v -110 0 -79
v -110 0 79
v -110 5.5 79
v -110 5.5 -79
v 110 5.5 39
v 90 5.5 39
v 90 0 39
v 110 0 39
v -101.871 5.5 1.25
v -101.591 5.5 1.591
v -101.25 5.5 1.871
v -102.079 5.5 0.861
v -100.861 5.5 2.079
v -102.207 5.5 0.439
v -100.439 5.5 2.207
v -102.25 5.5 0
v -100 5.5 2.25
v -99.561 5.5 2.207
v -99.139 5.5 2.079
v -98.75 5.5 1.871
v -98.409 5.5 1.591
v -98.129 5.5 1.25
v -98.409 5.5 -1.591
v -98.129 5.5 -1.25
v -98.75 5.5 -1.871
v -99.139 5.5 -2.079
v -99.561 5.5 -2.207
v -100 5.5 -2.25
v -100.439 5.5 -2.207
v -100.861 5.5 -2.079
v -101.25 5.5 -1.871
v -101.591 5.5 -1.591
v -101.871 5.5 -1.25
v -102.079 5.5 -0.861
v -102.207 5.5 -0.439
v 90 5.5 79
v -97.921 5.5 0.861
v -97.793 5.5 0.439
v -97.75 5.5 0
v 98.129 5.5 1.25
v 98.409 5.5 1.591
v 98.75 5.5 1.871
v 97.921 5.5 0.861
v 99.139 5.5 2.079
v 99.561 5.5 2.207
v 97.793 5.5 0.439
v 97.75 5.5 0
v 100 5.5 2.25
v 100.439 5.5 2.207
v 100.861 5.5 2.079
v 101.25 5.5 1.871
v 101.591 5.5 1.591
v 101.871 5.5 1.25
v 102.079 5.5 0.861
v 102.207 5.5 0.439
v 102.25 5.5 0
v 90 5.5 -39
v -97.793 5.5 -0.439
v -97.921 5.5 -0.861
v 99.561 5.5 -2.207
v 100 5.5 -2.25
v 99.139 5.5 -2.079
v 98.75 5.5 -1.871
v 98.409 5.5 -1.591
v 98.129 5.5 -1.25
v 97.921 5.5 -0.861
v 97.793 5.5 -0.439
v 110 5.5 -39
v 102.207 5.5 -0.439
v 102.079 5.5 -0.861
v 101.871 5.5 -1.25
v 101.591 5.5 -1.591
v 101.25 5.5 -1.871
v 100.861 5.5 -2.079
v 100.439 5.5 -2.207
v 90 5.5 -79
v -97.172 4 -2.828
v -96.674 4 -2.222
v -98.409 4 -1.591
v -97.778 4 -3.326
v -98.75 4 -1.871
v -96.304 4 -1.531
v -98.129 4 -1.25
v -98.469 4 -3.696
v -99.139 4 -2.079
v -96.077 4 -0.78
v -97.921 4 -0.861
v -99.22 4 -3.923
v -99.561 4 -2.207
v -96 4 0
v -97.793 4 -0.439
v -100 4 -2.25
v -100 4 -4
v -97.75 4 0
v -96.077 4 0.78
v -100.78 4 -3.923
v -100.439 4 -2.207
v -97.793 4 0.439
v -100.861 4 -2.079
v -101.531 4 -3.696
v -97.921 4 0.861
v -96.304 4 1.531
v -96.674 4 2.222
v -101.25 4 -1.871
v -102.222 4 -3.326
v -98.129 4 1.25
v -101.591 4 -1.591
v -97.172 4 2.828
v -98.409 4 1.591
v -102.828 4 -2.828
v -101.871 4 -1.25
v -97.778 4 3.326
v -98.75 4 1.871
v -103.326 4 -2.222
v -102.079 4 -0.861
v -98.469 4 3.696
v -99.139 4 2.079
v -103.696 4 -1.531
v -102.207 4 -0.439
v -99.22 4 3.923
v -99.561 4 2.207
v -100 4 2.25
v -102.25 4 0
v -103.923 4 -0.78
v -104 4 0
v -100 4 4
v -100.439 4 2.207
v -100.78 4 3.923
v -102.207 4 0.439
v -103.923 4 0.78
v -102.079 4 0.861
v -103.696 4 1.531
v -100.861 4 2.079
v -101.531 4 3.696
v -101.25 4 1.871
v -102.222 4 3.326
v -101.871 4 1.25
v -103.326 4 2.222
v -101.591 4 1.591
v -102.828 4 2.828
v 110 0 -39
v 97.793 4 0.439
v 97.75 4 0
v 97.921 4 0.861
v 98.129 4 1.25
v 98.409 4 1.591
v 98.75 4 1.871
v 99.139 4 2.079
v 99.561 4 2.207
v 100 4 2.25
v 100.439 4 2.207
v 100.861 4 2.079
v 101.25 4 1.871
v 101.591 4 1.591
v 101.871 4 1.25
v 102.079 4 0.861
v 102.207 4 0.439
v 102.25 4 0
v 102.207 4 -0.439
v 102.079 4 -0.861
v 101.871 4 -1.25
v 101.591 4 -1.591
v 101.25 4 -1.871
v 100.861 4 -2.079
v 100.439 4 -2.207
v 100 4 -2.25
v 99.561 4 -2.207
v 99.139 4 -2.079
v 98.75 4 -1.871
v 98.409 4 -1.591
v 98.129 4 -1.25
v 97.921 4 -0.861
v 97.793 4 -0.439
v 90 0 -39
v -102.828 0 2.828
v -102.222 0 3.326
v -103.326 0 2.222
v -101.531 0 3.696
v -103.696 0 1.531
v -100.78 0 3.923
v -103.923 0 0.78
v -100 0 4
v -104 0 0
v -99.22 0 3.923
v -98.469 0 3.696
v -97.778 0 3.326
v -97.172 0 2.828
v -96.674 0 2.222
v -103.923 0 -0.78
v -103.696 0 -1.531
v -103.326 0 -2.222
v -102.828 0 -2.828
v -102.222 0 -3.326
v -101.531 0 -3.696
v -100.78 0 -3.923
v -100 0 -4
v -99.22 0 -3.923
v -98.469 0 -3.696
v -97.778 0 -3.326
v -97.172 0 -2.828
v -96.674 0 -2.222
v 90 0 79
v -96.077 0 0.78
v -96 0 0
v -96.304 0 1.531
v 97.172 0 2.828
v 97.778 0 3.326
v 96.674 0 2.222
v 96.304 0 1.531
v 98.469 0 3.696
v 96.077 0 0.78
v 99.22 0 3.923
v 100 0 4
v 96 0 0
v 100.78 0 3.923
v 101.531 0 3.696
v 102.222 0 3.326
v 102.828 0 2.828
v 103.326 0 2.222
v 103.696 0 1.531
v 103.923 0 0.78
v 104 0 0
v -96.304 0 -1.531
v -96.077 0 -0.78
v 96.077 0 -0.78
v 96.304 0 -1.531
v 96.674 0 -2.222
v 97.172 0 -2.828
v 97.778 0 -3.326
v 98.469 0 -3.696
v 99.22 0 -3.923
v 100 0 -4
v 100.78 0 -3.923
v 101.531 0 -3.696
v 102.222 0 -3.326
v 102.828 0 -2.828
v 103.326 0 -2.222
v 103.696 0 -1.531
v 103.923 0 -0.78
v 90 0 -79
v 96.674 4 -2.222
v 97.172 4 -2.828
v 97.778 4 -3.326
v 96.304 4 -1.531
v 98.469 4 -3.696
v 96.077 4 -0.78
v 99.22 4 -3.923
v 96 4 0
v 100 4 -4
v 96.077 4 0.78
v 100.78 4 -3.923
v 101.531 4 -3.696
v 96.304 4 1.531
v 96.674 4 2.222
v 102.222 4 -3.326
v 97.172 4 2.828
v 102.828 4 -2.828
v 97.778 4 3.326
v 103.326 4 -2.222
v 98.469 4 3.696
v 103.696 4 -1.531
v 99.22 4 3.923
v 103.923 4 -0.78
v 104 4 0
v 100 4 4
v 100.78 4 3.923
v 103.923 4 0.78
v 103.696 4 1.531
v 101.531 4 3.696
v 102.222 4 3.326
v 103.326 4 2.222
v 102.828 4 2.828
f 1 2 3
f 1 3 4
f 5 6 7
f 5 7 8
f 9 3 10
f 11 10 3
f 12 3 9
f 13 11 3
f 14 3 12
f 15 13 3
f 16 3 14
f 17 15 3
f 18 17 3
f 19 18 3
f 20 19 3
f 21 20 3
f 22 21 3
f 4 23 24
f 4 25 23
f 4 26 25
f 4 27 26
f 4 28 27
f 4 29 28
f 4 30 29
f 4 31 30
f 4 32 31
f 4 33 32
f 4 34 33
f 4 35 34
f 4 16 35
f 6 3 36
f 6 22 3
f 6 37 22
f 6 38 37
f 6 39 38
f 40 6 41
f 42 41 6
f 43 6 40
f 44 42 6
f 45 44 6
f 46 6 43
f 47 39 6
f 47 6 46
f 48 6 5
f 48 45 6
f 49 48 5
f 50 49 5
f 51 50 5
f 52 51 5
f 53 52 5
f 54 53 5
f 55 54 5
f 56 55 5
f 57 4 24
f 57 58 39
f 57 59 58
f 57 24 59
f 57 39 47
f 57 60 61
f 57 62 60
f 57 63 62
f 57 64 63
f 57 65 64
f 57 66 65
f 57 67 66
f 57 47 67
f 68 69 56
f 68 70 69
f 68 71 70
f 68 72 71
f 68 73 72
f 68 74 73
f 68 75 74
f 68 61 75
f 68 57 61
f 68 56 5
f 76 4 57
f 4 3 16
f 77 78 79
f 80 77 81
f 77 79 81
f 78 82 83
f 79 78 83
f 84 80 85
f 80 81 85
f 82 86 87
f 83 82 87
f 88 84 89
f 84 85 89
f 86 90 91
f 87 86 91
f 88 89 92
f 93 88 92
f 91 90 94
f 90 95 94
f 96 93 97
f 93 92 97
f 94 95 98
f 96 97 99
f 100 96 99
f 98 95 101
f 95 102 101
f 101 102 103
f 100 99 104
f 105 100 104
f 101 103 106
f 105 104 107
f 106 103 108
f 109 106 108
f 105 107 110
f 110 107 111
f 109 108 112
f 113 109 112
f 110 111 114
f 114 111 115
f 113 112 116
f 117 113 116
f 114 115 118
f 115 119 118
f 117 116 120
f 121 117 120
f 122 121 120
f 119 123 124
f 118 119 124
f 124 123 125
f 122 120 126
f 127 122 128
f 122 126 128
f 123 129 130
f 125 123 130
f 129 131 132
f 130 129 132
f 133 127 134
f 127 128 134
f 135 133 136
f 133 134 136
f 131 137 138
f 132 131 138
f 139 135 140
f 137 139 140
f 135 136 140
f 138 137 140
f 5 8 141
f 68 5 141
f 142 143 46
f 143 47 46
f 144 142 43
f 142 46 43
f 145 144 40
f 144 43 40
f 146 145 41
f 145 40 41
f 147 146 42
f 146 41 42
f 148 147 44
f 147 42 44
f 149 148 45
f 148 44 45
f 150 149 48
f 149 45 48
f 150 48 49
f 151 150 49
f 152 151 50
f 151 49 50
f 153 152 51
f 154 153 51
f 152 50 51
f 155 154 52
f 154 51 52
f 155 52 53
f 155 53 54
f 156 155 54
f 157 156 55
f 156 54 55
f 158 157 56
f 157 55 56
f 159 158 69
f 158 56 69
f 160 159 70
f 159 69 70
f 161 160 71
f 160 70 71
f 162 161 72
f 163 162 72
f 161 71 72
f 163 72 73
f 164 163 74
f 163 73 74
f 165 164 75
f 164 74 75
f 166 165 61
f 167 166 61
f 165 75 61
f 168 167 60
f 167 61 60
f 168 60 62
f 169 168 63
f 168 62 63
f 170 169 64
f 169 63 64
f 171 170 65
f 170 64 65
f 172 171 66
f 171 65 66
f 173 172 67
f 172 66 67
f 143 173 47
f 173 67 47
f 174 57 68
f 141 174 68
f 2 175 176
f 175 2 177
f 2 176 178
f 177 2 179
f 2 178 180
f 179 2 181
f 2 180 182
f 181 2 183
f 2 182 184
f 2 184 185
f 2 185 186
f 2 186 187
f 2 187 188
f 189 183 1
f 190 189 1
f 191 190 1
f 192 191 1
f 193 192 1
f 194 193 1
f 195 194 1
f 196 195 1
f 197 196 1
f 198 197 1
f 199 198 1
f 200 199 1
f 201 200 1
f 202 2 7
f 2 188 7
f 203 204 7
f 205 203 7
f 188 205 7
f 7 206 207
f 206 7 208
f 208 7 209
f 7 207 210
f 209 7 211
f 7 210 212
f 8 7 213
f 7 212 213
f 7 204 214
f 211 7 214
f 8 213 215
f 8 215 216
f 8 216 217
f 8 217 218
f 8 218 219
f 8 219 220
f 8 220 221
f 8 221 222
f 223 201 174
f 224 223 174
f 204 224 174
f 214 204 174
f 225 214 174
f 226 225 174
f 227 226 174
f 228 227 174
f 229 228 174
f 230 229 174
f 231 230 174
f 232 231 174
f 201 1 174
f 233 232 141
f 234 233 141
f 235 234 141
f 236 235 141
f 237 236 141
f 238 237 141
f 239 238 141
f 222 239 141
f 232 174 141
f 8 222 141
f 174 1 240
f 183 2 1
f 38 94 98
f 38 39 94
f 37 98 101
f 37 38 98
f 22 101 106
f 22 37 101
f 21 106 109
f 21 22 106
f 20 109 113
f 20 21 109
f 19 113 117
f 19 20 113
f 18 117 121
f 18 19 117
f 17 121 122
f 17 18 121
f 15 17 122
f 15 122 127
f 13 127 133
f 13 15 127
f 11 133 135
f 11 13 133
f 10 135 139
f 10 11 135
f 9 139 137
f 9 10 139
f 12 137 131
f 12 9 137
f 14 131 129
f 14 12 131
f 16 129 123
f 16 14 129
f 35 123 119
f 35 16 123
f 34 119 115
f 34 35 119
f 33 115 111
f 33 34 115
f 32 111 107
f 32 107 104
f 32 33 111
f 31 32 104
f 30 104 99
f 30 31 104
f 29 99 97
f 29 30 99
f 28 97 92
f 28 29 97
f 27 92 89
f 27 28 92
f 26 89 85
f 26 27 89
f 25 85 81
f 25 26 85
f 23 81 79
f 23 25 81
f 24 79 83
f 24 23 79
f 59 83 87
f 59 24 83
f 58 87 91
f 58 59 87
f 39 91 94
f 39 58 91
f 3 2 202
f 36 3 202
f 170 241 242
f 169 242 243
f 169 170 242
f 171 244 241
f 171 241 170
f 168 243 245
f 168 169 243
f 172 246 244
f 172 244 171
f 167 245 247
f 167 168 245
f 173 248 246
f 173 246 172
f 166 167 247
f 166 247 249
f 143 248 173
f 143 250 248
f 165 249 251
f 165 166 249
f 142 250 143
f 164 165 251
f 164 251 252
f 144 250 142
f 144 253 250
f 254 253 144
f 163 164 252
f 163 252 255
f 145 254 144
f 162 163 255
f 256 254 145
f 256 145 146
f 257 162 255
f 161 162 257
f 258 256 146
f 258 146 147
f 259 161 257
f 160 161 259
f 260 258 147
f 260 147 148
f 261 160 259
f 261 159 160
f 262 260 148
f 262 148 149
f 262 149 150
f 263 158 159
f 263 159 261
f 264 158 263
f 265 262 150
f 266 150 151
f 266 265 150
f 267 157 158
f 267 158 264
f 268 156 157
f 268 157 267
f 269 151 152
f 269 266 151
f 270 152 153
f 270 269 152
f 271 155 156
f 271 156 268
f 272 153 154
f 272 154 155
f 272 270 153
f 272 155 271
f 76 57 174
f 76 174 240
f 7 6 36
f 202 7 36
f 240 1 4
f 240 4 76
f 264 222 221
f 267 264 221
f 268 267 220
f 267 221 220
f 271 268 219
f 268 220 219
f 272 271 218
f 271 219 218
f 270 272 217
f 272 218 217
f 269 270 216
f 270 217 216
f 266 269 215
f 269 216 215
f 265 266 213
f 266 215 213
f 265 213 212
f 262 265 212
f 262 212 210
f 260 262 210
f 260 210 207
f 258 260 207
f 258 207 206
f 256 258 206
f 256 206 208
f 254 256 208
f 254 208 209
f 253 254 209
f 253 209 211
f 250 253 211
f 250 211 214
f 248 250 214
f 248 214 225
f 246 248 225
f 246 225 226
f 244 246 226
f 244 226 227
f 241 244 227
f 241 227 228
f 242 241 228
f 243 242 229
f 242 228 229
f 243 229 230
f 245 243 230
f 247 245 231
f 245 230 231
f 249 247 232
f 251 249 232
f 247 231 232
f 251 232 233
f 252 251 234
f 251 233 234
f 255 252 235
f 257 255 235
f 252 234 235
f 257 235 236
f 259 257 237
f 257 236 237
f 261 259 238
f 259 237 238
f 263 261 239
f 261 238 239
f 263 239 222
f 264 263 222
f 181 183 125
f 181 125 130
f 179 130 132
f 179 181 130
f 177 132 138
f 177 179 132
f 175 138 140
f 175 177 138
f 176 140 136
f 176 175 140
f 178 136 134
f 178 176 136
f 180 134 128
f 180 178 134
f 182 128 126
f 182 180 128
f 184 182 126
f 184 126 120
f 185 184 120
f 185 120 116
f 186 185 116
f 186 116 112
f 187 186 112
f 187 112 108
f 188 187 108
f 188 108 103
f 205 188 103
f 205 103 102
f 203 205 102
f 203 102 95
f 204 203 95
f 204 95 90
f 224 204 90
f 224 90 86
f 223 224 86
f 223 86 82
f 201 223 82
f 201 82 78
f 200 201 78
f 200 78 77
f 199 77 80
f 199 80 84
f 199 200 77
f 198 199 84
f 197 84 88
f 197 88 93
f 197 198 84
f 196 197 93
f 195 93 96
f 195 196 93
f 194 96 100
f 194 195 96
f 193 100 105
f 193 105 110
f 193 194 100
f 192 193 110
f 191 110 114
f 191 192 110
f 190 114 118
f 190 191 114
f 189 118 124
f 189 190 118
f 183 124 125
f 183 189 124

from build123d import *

# Parameters (mm, degrees)
SKETCH1_W                      = 220
SKETCH1_H                      = 158
BOSS_EXTRUDE1_DEPTH            = 5.5
CBORE_FOR_M4_SHCS1_D           = 4.5
CBORE_FOR_M4_SHCS1_CBORE_D     = 8
CBORE_FOR_M4_SHCS1_CBORE_DEPTH = 4
SKETCH6_W                      = 20
SKETCH6_H                      = 40
CUT_EXTRUDE2_DEPTH             = 6.5


with BuildPart() as part:
    # Sketch1 → Boss-Extrude1 (new body)
    with BuildSketch(Plane(origin=(0, 0, 0), x_dir=(1, 0, 0), z_dir=(0, 1, 0))):
        Rectangle(SKETCH1_W, SKETCH1_H)
    extrude(amount=BOSS_EXTRUDE1_DEPTH)

    # CBORE for M4 SHCS1 (through all)
    with Locations(Plane.XZ):
        with Locations((100, 0)):
            cbore_for_m4_shcs1 = CounterBoreHole(CBORE_FOR_M4_SHCS1_D / 2, CBORE_FOR_M4_SHCS1_CBORE_D / 2, CBORE_FOR_M4_SHCS1_CBORE_DEPTH)

    # Mirror2: CBORE for M4 SHCS1 across plane
    add(cbore_for_m4_shcs1.mirror(Plane(origin=(0, 0, 0), x_dir=(0, 0, 1), z_dir=(1, 0, 0))), mode=Mode.SUBTRACT)

    # Sketch6 → Cut-Extrude2 (cut, through all)
    with BuildSketch(Plane(origin=(0, 5.5, 0), x_dir=(1, 0, 0), z_dir=(0, 1, 0))):
        with Locations((100, 59)):
            Rectangle(SKETCH6_W, SKETCH6_H)
    cut_extrude2 = extrude(amount=-CUT_EXTRUDE2_DEPTH, mode=Mode.SUBTRACT)

    # Mirror3: Cut-Extrude2 across plane
    add(cut_extrude2.mirror(Plane.XY), mode=Mode.SUBTRACT)


solid = part.part
